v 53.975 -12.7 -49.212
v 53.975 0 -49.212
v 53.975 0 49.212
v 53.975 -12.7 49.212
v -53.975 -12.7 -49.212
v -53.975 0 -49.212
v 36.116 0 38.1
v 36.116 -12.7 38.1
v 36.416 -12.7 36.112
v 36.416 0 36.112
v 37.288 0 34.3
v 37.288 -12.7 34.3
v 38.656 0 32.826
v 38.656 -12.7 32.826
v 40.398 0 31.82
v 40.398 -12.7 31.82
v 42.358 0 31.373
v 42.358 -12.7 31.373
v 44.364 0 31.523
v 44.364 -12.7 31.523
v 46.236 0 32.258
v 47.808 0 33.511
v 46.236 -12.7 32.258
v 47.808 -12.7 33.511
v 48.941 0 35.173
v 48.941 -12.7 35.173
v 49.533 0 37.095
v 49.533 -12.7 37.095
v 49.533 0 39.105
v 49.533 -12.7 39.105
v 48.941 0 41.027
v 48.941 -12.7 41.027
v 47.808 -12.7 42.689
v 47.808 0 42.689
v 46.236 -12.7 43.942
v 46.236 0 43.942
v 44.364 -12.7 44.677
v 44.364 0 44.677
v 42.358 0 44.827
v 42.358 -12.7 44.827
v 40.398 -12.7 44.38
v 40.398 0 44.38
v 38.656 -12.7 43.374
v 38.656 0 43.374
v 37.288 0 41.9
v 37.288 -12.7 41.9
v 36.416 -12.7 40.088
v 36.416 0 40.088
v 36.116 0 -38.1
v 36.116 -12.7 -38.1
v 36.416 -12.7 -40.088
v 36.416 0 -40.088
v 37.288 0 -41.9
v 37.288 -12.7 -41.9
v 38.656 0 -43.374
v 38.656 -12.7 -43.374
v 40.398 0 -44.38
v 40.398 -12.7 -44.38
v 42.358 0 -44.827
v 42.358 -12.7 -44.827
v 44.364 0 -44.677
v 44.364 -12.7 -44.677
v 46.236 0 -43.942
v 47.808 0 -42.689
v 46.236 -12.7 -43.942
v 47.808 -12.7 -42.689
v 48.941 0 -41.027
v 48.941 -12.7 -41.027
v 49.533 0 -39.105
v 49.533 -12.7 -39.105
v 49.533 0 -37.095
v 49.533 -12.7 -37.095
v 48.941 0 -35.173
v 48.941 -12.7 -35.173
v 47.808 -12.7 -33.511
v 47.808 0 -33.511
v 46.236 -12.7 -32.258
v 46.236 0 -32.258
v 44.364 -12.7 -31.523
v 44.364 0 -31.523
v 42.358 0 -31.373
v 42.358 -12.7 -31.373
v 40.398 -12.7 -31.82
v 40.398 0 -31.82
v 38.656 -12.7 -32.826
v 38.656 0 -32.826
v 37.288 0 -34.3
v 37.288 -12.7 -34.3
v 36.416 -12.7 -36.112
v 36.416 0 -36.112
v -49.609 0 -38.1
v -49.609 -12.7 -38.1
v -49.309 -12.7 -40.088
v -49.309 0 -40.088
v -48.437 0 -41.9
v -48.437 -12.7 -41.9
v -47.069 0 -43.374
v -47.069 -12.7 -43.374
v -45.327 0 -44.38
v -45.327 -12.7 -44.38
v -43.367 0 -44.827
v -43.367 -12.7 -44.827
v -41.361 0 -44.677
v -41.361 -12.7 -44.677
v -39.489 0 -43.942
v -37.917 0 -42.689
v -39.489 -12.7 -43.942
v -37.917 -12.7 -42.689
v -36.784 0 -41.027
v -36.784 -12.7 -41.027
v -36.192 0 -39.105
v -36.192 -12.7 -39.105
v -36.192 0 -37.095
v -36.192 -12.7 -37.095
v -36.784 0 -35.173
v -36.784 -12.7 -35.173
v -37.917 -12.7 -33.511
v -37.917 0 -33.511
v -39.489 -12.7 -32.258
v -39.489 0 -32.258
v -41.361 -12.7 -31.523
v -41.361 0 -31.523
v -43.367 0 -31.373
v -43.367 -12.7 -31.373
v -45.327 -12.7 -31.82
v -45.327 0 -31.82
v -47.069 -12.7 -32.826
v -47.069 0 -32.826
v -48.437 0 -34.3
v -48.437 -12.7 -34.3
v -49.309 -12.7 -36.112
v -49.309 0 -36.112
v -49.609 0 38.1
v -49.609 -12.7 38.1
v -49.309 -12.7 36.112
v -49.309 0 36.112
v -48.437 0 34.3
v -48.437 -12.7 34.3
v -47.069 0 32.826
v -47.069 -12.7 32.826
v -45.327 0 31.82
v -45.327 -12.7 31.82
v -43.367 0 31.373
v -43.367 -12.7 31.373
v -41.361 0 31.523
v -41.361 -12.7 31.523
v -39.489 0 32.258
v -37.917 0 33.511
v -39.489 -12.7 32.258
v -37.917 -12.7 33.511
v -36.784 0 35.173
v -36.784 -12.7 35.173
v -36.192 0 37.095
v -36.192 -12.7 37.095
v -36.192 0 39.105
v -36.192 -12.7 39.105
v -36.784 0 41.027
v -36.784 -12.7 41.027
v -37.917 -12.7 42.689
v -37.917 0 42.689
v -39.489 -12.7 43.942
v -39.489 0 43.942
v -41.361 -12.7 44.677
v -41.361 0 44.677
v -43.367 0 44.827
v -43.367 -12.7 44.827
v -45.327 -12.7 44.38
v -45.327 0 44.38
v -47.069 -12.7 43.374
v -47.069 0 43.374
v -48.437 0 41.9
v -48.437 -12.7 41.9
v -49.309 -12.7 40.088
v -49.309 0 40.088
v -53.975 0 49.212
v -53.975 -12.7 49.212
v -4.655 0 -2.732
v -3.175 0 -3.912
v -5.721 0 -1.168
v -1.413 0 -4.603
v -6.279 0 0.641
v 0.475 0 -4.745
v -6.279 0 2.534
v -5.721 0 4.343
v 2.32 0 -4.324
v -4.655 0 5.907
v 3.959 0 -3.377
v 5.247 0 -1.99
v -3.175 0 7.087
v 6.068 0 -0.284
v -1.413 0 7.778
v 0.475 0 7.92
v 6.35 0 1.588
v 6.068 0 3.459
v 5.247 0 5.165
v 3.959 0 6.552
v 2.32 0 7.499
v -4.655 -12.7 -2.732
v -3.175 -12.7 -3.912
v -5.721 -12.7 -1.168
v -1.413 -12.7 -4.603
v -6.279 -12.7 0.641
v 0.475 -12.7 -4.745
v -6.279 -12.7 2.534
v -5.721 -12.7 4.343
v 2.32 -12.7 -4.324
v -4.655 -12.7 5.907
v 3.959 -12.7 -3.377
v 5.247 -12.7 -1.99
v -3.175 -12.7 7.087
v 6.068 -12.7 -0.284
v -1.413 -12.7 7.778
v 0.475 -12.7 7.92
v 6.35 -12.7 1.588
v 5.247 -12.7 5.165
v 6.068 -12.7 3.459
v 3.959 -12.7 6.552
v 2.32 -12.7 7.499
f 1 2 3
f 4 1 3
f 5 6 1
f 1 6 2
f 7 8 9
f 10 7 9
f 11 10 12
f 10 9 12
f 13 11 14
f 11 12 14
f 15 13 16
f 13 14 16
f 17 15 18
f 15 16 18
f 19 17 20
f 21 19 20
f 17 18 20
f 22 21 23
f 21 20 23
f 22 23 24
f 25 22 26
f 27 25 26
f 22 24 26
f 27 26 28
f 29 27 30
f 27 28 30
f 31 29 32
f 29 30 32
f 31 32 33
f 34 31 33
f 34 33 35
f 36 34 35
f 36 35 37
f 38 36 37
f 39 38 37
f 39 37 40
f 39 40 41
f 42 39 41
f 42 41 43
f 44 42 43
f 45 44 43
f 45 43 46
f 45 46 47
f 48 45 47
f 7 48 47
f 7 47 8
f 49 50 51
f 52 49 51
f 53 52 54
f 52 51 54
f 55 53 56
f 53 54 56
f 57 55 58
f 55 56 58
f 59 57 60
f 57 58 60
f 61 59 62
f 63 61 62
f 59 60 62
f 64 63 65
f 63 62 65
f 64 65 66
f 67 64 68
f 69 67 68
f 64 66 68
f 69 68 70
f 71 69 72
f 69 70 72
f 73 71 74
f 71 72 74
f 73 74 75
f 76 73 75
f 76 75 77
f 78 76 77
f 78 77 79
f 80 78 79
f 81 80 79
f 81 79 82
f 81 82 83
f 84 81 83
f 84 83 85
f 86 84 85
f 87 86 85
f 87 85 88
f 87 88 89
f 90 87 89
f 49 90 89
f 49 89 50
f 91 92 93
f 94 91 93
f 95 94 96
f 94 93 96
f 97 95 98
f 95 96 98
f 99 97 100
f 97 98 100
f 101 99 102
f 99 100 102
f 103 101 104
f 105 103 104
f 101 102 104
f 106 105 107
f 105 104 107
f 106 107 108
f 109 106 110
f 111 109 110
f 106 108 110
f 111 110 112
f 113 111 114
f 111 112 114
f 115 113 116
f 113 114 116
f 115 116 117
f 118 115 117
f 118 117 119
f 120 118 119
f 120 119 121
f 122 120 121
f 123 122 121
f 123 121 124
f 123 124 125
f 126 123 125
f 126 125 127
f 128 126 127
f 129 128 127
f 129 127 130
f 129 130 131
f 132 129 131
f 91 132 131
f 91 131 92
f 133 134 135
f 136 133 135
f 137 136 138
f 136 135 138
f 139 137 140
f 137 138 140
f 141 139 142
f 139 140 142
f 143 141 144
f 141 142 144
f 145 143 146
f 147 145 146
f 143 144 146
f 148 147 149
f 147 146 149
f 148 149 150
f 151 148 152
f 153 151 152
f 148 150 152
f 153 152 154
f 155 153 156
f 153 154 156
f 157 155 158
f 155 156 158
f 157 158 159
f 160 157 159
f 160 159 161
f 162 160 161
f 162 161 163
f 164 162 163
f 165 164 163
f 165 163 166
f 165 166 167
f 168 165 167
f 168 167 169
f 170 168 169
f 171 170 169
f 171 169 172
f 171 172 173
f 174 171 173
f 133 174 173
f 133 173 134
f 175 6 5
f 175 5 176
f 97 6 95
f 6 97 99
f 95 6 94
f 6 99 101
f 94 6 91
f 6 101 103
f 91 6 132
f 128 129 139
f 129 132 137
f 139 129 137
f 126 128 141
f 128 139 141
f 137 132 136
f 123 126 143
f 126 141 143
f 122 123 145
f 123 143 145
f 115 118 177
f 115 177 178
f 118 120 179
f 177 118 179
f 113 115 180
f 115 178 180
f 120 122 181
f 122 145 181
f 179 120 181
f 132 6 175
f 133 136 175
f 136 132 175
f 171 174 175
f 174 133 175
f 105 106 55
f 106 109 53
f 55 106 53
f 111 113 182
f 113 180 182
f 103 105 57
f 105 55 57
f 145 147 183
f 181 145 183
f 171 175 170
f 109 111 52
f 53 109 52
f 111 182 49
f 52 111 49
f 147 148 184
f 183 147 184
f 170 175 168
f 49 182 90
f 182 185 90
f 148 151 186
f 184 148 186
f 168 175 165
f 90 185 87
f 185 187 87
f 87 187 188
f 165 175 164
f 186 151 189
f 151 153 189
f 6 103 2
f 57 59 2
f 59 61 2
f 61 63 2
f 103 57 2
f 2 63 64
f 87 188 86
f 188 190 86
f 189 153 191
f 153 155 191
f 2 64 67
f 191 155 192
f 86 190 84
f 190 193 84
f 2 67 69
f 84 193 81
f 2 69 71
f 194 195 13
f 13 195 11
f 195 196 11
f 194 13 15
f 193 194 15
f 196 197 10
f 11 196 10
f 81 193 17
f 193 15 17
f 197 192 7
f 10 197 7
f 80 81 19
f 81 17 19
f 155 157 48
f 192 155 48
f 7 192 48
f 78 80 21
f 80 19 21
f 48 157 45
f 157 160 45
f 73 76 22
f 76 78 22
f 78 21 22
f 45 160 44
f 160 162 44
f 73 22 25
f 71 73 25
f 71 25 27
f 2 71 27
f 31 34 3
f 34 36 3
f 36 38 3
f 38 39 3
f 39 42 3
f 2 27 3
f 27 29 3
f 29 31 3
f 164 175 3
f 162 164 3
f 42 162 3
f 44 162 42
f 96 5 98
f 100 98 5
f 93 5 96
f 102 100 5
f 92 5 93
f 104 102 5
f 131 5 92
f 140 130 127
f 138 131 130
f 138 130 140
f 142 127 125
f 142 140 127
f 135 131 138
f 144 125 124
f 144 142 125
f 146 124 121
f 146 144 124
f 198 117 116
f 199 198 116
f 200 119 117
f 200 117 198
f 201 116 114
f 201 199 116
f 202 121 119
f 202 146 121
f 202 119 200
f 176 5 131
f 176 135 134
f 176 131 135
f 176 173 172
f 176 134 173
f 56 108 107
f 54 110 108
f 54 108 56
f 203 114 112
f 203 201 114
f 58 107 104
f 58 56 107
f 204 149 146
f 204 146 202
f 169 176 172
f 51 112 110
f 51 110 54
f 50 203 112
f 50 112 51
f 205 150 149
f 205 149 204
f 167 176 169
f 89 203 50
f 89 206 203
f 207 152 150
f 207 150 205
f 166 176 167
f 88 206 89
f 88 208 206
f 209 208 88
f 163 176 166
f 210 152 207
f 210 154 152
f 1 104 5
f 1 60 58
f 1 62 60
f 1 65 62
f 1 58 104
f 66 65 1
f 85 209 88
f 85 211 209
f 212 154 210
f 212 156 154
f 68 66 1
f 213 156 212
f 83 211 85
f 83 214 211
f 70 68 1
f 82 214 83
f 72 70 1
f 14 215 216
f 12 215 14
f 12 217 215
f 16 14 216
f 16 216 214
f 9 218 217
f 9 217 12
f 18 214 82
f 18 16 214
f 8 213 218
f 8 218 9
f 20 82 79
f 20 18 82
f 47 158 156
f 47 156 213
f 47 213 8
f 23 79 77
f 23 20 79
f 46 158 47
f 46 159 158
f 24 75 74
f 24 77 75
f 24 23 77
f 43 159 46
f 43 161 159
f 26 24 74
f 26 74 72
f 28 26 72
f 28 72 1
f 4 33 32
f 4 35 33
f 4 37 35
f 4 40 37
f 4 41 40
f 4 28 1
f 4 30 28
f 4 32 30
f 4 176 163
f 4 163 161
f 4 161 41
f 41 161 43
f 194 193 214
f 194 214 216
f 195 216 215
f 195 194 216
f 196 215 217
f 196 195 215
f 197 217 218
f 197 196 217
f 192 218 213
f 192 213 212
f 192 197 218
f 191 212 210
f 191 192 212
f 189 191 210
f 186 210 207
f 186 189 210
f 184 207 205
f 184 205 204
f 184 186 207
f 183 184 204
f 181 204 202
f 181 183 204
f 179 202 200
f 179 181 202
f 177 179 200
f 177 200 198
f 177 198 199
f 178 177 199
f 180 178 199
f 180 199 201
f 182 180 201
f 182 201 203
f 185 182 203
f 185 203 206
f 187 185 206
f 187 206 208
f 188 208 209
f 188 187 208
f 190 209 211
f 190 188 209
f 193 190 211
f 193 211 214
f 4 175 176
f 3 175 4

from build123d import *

# Parameters (mm, degrees)
F0_W     = 107.95
F0_H     = 98.425
F0_R     = 6.35
F1_DEPTH = 12.7
F2_D     = 13.49248


with BuildPart() as f1:
    # F0 (on Front) → F1 (new body)
    with BuildSketch(Plane.XZ):
        Rectangle(F0_W, F0_H)
        with Locations((0, 1.5875)):
            Circle(F0_R, mode=Mode.SUBTRACT)
    extrude(amount=F1_DEPTH)

    # F2 (through all)
    with Locations(Plane(origin=(0, 0, 0), x_dir=(1, 0, 0), z_dir=(0, 1, 0))):
        with Locations((-42.8625, -38.1), (42.8625, -38.1), (42.8625, 38.1), (-42.8625, 38.1)):
            Hole(F2_D / 2)


solid = f1.part
